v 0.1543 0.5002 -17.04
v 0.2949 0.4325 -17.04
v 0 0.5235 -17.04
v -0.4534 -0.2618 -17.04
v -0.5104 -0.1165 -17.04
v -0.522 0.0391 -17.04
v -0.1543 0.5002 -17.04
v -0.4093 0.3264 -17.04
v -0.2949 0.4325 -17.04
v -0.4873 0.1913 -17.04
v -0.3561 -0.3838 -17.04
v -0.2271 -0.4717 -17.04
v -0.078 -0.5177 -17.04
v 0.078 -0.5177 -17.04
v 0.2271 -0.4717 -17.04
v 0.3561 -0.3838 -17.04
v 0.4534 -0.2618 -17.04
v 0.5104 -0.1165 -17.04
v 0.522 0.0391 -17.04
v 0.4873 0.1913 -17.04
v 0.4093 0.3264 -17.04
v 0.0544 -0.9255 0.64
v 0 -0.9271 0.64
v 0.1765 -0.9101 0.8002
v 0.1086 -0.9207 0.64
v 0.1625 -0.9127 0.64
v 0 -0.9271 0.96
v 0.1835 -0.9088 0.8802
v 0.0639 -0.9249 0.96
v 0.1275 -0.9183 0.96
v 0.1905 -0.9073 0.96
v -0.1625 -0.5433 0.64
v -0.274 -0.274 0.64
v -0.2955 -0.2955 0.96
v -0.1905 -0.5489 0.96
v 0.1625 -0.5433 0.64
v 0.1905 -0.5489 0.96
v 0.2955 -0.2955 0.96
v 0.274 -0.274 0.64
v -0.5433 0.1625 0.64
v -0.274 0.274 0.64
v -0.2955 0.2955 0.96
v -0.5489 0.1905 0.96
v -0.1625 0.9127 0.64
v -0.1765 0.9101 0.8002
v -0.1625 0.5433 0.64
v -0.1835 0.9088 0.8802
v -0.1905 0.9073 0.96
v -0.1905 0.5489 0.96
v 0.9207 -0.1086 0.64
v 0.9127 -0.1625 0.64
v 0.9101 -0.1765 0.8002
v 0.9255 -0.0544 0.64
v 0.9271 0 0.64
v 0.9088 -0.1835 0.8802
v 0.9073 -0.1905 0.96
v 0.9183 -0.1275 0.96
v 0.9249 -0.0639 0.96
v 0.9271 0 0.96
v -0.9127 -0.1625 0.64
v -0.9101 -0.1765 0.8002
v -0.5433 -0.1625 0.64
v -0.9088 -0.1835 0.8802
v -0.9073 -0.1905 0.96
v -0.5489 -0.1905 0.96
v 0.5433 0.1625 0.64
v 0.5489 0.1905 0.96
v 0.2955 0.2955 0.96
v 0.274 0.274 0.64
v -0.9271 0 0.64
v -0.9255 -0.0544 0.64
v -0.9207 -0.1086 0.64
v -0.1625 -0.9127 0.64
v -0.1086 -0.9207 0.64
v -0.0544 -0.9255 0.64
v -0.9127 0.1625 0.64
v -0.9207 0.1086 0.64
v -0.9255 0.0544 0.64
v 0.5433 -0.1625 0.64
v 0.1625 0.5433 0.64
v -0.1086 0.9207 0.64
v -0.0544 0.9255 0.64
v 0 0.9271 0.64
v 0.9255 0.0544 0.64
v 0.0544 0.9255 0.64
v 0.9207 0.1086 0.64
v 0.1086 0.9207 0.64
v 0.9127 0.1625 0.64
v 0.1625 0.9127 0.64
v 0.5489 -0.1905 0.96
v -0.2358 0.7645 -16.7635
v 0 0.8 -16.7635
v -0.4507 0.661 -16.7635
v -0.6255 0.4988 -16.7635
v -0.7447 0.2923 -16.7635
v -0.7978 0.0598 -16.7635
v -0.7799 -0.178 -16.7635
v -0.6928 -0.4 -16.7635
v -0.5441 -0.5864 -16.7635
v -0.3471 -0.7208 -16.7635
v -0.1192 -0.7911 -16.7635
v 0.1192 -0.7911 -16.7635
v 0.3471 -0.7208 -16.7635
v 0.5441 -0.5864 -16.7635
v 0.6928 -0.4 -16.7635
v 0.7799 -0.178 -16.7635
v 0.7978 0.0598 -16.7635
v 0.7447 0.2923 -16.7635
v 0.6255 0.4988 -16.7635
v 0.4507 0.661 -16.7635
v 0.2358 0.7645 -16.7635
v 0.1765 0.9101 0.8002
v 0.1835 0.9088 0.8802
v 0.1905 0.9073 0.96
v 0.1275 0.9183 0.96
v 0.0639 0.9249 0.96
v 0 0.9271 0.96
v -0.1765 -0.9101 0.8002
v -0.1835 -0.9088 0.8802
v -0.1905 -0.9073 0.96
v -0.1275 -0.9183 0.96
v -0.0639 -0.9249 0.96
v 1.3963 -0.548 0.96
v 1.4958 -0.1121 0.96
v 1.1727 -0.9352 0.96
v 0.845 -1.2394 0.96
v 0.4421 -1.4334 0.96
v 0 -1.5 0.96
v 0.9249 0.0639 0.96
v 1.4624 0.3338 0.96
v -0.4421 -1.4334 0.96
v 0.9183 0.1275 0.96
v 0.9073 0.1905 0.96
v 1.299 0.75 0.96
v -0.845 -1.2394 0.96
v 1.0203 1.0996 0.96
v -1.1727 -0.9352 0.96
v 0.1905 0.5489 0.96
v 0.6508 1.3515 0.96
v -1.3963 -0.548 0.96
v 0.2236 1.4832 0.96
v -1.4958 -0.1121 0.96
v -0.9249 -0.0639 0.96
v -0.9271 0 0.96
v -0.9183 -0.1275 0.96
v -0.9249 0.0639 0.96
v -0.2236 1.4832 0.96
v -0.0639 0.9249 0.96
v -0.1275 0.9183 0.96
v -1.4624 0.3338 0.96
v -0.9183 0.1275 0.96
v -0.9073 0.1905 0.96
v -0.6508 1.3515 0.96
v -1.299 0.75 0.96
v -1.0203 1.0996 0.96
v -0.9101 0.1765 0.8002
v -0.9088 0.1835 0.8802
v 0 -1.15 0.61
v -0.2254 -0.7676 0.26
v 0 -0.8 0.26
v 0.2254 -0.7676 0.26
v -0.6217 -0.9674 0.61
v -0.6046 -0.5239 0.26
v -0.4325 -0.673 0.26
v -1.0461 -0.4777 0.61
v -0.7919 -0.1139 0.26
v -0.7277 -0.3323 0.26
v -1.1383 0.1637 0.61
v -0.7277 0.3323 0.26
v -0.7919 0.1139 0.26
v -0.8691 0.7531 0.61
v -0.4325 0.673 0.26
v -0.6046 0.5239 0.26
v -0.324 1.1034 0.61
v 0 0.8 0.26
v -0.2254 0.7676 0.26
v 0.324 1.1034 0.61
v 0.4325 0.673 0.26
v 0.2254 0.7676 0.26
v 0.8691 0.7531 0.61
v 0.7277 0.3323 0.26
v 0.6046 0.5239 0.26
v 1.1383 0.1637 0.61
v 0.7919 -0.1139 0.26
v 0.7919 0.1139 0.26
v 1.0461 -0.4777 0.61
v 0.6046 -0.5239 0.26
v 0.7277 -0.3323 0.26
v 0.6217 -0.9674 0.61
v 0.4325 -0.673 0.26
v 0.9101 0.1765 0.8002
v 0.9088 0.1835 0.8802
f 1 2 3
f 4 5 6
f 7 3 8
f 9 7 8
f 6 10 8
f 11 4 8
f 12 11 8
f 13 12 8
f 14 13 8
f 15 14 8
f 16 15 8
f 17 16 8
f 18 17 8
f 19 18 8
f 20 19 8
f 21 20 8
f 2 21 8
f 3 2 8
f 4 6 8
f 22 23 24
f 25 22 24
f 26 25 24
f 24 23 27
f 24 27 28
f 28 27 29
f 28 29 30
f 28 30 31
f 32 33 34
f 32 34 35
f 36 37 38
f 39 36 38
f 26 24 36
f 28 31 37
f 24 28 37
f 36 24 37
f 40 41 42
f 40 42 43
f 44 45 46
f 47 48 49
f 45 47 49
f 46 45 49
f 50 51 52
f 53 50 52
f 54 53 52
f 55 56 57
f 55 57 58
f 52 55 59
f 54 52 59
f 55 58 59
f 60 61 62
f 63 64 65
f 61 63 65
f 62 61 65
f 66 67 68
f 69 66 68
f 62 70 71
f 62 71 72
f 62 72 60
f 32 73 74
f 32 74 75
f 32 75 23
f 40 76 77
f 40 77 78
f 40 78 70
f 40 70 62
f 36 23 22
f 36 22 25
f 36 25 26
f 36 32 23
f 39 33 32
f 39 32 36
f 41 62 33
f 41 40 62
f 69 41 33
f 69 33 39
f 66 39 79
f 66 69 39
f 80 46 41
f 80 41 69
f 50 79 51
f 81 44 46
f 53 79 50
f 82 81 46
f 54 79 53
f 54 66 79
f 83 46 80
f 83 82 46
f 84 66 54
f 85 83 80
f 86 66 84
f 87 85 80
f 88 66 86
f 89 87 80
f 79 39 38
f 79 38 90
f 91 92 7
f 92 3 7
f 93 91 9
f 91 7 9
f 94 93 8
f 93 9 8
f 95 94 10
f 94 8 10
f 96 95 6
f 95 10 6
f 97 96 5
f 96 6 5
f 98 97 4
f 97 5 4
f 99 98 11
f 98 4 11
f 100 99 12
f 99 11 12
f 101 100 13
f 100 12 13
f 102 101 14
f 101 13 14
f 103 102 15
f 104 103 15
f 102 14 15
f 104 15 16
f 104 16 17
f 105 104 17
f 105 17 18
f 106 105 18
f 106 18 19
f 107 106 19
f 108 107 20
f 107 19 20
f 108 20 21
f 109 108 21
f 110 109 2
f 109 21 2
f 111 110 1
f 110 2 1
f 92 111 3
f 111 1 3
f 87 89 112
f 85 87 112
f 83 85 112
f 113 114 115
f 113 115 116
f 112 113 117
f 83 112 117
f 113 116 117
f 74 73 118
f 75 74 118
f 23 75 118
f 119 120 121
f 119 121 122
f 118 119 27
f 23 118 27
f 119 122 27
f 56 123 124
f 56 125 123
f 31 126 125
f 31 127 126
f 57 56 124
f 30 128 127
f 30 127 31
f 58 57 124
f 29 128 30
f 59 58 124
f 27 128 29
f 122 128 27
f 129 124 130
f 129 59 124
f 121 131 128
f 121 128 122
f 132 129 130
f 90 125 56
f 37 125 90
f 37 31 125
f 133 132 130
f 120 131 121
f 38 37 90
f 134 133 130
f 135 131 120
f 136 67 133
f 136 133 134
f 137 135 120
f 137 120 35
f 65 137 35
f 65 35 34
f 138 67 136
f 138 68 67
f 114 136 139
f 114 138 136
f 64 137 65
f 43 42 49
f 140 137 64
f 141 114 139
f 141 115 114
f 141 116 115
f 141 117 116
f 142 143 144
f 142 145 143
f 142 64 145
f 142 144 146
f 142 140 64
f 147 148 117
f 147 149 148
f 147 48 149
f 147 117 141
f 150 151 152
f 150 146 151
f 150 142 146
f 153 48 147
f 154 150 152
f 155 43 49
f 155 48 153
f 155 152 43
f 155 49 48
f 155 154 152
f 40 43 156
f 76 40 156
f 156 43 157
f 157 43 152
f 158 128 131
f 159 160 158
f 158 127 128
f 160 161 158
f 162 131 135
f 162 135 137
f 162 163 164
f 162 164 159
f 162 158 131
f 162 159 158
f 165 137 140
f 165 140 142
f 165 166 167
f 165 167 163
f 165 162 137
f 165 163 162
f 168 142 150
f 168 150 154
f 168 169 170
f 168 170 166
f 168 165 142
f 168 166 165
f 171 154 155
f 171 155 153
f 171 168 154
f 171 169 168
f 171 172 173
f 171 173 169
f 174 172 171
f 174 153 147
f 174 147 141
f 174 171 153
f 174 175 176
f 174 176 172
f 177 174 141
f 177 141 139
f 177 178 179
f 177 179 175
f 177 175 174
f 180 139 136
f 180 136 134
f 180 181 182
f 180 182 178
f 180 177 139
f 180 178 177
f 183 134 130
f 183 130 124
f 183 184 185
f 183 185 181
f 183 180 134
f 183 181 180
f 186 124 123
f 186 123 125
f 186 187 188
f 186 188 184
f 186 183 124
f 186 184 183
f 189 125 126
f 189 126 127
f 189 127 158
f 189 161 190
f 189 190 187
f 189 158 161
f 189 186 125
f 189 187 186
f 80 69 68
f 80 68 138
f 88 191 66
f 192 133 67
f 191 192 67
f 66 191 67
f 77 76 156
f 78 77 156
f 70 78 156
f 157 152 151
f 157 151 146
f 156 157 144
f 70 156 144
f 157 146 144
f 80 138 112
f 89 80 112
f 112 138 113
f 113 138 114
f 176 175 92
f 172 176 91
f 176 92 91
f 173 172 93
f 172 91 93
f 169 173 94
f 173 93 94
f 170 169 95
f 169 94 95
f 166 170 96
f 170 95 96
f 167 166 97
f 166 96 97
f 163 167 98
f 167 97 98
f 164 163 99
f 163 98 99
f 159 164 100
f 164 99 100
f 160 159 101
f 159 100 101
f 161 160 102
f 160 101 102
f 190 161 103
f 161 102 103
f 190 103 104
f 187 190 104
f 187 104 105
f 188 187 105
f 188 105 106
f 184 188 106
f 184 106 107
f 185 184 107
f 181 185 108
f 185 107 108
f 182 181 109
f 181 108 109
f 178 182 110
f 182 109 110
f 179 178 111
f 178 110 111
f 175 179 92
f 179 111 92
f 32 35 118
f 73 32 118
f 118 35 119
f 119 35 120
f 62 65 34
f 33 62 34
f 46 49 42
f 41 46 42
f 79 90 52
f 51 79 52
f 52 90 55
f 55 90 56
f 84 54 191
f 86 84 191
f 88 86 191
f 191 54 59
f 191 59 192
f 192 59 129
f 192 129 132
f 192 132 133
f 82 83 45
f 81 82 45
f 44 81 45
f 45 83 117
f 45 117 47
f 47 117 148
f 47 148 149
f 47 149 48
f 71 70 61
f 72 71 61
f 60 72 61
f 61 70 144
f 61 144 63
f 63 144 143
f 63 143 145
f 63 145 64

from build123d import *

# Parameters (mm, degrees)
CUT_EXTRUDE1_DEPTH  = 0.32
CIRPATTERN1_COUNT   = 4
DRAFT2_ANGLE        = 5
SKETCH8_R           = 0.8
BOSS_EXTRUDE1_DEPTH = 0.26
BOSS_EXTRUDE1_DRAFT = -45


with BuildPart() as part:
    # Sketch3 → Revolve1 (revolve)
    with BuildSketch(Plane(origin=(0, 0, 0), x_dir=(0, 0, -1), z_dir=(1, 0, 0)), mode=Mode.PRIVATE) as revolve1_sk:
        Polygon((-0.96, 0), (-0.96, 1.5), (-0.26, 0.8), (-0.26, 0), align=None)
    revolve(revolve1_sk.sketch.rotate(Axis((0, 0, 0.96), (0, 0, -1)), 180), axis=Axis((0, 0, 0.96), (0, 0, -1)))

    # Sketch5 → Revolve2 (revolve)
    with BuildSketch(Plane(origin=(0, 0, 0), x_dir=(0, 0, -1), z_dir=(1, 0, 0))):
        Polygon((17.04, 0), (-0.26, 0), (-0.26, 0.8), (16.7635, 0.8), (17.04, 0.5235), align=None)
    revolve(axis=Axis((0, 0, -17.04), (0, 0, 1)))

    # Sketch4 → Cut-Extrude1 (cut)
    with BuildSketch(Plane.XY.offset(0.96)):
        with BuildLine():
            Line((0, 0), (0.9271, 0))
            ThreePointArc((0.9271, 0), (0.92214099, 0.095762227), (0.907317012, 0.1905))
            Line((0.907317012, 0.1905), (0.548908506, 0.1905))
            Line((0.548908506, 0.1905), (0.295475421, 0.295475421))
            Line((0.295475421, 0.295475421), (0.1905, 0.548908506))
            Line((0.1905, 0.548908506), (0.1905, 0.907317012))
            ThreePointArc((0.1905, 0.907317012), (0.095762227, 0.92214099), (0, 0.9271))
            Line((0, 0.9271), (0, 0))
        make_face()
    cut_extrude1 = extrude(amount=-CUT_EXTRUDE1_DEPTH, mode=Mode.SUBTRACT)

    # CirPattern1: Cut-Extrude1 ×4 about axis
    cirpattern1_axis = Axis((0, 0, 0), (0, 0, 1))
    for i in range(1, CIRPATTERN1_COUNT):
        add(cut_extrude1.rotate(cirpattern1_axis, i * 360 / CIRPATTERN1_COUNT), mode=Mode.SUBTRACT)

    # Draft2
    draft2_faces = [part.faces().sort_by_distance(p)[0] for p in [
        (-0.728112759, 0.1905, 0.8),
        (-0.422191963, 0.24298771, 0.8),
        (-0.24298771, 0.422191963, 0.8),
        (-0.1905, 0.728112759, 0.8),
        (0.1905, 0.728112759, 0.8),
        (0.24298771, 0.422191963, 0.8),
        (0.422191963, 0.24298771, 0.8),
        (0.728112759, 0.1905, 0.8),
        (0.728112759, -0.1905, 0.8),
        (0.422191963, -0.24298771, 0.8),
        (0.24298771, -0.422191963, 0.8),
        (0.1905, -0.728112759, 0.8),
        (-0.1905, -0.728112759, 0.8),
        (-0.24298771, -0.422191963, 0.8),
        (-0.422191963, -0.24298771, 0.8),
        (-0.728112759, -0.1905, 0.8),
    ]]
    draft(draft2_faces, Plane(origin=(0, 0, 0.96), x_dir=(0, 1, 0), z_dir=(0, 0, 1)), DRAFT2_ANGLE)


with BuildPart() as body_2:
    # Split1: the piece on the far side of the plane
    add(part.part)
    split(bisect_by=Plane(origin=(0, 0, 0.26), x_dir=(0, -1, 0), z_dir=(0, 0, -1)), keep=Keep.BOTTOM)


with BuildPart() as part_1:
    add(part.part)

    # Split1
    split(bisect_by=Plane(origin=(0, 0, 0.26), x_dir=(0, -1, 0), z_dir=(0, 0, -1)), keep=Keep.TOP)


with BuildPart() as body_2_1:
    add(body_2.part)

    # Combine1: union part
    add(part_1.part)


with BuildPart() as boss_extrude1_tool:
    # Sketch8 → Boss-Extrude1 (with draft: the straight prism first)
    with BuildSketch(Plane.XY.offset(0.26)):
        with Locations(Location((0, 0, 0), (0, 0, 90))):
            Circle(SKETCH8_R)
    extrude(amount=-BOSS_EXTRUDE1_DEPTH)
    # Boss-Extrude1: the draft: its side faces are tilted about the plane it starts from
    boss_extrude1_sides = [boss_extrude1_tool.faces().sort_by_distance(p)[0] for p in [
        (0, -0.8, 0.13),
    ]]
    draft(boss_extrude1_sides, Plane.XY.offset(0.26), BOSS_EXTRUDE1_DRAFT)


with BuildPart() as body_2_2:
    add(body_2_1.part)

    # Boss-Extrude1: add boss_extrude1_tool
    add(boss_extrude1_tool.part)


solid = body_2_2.part
